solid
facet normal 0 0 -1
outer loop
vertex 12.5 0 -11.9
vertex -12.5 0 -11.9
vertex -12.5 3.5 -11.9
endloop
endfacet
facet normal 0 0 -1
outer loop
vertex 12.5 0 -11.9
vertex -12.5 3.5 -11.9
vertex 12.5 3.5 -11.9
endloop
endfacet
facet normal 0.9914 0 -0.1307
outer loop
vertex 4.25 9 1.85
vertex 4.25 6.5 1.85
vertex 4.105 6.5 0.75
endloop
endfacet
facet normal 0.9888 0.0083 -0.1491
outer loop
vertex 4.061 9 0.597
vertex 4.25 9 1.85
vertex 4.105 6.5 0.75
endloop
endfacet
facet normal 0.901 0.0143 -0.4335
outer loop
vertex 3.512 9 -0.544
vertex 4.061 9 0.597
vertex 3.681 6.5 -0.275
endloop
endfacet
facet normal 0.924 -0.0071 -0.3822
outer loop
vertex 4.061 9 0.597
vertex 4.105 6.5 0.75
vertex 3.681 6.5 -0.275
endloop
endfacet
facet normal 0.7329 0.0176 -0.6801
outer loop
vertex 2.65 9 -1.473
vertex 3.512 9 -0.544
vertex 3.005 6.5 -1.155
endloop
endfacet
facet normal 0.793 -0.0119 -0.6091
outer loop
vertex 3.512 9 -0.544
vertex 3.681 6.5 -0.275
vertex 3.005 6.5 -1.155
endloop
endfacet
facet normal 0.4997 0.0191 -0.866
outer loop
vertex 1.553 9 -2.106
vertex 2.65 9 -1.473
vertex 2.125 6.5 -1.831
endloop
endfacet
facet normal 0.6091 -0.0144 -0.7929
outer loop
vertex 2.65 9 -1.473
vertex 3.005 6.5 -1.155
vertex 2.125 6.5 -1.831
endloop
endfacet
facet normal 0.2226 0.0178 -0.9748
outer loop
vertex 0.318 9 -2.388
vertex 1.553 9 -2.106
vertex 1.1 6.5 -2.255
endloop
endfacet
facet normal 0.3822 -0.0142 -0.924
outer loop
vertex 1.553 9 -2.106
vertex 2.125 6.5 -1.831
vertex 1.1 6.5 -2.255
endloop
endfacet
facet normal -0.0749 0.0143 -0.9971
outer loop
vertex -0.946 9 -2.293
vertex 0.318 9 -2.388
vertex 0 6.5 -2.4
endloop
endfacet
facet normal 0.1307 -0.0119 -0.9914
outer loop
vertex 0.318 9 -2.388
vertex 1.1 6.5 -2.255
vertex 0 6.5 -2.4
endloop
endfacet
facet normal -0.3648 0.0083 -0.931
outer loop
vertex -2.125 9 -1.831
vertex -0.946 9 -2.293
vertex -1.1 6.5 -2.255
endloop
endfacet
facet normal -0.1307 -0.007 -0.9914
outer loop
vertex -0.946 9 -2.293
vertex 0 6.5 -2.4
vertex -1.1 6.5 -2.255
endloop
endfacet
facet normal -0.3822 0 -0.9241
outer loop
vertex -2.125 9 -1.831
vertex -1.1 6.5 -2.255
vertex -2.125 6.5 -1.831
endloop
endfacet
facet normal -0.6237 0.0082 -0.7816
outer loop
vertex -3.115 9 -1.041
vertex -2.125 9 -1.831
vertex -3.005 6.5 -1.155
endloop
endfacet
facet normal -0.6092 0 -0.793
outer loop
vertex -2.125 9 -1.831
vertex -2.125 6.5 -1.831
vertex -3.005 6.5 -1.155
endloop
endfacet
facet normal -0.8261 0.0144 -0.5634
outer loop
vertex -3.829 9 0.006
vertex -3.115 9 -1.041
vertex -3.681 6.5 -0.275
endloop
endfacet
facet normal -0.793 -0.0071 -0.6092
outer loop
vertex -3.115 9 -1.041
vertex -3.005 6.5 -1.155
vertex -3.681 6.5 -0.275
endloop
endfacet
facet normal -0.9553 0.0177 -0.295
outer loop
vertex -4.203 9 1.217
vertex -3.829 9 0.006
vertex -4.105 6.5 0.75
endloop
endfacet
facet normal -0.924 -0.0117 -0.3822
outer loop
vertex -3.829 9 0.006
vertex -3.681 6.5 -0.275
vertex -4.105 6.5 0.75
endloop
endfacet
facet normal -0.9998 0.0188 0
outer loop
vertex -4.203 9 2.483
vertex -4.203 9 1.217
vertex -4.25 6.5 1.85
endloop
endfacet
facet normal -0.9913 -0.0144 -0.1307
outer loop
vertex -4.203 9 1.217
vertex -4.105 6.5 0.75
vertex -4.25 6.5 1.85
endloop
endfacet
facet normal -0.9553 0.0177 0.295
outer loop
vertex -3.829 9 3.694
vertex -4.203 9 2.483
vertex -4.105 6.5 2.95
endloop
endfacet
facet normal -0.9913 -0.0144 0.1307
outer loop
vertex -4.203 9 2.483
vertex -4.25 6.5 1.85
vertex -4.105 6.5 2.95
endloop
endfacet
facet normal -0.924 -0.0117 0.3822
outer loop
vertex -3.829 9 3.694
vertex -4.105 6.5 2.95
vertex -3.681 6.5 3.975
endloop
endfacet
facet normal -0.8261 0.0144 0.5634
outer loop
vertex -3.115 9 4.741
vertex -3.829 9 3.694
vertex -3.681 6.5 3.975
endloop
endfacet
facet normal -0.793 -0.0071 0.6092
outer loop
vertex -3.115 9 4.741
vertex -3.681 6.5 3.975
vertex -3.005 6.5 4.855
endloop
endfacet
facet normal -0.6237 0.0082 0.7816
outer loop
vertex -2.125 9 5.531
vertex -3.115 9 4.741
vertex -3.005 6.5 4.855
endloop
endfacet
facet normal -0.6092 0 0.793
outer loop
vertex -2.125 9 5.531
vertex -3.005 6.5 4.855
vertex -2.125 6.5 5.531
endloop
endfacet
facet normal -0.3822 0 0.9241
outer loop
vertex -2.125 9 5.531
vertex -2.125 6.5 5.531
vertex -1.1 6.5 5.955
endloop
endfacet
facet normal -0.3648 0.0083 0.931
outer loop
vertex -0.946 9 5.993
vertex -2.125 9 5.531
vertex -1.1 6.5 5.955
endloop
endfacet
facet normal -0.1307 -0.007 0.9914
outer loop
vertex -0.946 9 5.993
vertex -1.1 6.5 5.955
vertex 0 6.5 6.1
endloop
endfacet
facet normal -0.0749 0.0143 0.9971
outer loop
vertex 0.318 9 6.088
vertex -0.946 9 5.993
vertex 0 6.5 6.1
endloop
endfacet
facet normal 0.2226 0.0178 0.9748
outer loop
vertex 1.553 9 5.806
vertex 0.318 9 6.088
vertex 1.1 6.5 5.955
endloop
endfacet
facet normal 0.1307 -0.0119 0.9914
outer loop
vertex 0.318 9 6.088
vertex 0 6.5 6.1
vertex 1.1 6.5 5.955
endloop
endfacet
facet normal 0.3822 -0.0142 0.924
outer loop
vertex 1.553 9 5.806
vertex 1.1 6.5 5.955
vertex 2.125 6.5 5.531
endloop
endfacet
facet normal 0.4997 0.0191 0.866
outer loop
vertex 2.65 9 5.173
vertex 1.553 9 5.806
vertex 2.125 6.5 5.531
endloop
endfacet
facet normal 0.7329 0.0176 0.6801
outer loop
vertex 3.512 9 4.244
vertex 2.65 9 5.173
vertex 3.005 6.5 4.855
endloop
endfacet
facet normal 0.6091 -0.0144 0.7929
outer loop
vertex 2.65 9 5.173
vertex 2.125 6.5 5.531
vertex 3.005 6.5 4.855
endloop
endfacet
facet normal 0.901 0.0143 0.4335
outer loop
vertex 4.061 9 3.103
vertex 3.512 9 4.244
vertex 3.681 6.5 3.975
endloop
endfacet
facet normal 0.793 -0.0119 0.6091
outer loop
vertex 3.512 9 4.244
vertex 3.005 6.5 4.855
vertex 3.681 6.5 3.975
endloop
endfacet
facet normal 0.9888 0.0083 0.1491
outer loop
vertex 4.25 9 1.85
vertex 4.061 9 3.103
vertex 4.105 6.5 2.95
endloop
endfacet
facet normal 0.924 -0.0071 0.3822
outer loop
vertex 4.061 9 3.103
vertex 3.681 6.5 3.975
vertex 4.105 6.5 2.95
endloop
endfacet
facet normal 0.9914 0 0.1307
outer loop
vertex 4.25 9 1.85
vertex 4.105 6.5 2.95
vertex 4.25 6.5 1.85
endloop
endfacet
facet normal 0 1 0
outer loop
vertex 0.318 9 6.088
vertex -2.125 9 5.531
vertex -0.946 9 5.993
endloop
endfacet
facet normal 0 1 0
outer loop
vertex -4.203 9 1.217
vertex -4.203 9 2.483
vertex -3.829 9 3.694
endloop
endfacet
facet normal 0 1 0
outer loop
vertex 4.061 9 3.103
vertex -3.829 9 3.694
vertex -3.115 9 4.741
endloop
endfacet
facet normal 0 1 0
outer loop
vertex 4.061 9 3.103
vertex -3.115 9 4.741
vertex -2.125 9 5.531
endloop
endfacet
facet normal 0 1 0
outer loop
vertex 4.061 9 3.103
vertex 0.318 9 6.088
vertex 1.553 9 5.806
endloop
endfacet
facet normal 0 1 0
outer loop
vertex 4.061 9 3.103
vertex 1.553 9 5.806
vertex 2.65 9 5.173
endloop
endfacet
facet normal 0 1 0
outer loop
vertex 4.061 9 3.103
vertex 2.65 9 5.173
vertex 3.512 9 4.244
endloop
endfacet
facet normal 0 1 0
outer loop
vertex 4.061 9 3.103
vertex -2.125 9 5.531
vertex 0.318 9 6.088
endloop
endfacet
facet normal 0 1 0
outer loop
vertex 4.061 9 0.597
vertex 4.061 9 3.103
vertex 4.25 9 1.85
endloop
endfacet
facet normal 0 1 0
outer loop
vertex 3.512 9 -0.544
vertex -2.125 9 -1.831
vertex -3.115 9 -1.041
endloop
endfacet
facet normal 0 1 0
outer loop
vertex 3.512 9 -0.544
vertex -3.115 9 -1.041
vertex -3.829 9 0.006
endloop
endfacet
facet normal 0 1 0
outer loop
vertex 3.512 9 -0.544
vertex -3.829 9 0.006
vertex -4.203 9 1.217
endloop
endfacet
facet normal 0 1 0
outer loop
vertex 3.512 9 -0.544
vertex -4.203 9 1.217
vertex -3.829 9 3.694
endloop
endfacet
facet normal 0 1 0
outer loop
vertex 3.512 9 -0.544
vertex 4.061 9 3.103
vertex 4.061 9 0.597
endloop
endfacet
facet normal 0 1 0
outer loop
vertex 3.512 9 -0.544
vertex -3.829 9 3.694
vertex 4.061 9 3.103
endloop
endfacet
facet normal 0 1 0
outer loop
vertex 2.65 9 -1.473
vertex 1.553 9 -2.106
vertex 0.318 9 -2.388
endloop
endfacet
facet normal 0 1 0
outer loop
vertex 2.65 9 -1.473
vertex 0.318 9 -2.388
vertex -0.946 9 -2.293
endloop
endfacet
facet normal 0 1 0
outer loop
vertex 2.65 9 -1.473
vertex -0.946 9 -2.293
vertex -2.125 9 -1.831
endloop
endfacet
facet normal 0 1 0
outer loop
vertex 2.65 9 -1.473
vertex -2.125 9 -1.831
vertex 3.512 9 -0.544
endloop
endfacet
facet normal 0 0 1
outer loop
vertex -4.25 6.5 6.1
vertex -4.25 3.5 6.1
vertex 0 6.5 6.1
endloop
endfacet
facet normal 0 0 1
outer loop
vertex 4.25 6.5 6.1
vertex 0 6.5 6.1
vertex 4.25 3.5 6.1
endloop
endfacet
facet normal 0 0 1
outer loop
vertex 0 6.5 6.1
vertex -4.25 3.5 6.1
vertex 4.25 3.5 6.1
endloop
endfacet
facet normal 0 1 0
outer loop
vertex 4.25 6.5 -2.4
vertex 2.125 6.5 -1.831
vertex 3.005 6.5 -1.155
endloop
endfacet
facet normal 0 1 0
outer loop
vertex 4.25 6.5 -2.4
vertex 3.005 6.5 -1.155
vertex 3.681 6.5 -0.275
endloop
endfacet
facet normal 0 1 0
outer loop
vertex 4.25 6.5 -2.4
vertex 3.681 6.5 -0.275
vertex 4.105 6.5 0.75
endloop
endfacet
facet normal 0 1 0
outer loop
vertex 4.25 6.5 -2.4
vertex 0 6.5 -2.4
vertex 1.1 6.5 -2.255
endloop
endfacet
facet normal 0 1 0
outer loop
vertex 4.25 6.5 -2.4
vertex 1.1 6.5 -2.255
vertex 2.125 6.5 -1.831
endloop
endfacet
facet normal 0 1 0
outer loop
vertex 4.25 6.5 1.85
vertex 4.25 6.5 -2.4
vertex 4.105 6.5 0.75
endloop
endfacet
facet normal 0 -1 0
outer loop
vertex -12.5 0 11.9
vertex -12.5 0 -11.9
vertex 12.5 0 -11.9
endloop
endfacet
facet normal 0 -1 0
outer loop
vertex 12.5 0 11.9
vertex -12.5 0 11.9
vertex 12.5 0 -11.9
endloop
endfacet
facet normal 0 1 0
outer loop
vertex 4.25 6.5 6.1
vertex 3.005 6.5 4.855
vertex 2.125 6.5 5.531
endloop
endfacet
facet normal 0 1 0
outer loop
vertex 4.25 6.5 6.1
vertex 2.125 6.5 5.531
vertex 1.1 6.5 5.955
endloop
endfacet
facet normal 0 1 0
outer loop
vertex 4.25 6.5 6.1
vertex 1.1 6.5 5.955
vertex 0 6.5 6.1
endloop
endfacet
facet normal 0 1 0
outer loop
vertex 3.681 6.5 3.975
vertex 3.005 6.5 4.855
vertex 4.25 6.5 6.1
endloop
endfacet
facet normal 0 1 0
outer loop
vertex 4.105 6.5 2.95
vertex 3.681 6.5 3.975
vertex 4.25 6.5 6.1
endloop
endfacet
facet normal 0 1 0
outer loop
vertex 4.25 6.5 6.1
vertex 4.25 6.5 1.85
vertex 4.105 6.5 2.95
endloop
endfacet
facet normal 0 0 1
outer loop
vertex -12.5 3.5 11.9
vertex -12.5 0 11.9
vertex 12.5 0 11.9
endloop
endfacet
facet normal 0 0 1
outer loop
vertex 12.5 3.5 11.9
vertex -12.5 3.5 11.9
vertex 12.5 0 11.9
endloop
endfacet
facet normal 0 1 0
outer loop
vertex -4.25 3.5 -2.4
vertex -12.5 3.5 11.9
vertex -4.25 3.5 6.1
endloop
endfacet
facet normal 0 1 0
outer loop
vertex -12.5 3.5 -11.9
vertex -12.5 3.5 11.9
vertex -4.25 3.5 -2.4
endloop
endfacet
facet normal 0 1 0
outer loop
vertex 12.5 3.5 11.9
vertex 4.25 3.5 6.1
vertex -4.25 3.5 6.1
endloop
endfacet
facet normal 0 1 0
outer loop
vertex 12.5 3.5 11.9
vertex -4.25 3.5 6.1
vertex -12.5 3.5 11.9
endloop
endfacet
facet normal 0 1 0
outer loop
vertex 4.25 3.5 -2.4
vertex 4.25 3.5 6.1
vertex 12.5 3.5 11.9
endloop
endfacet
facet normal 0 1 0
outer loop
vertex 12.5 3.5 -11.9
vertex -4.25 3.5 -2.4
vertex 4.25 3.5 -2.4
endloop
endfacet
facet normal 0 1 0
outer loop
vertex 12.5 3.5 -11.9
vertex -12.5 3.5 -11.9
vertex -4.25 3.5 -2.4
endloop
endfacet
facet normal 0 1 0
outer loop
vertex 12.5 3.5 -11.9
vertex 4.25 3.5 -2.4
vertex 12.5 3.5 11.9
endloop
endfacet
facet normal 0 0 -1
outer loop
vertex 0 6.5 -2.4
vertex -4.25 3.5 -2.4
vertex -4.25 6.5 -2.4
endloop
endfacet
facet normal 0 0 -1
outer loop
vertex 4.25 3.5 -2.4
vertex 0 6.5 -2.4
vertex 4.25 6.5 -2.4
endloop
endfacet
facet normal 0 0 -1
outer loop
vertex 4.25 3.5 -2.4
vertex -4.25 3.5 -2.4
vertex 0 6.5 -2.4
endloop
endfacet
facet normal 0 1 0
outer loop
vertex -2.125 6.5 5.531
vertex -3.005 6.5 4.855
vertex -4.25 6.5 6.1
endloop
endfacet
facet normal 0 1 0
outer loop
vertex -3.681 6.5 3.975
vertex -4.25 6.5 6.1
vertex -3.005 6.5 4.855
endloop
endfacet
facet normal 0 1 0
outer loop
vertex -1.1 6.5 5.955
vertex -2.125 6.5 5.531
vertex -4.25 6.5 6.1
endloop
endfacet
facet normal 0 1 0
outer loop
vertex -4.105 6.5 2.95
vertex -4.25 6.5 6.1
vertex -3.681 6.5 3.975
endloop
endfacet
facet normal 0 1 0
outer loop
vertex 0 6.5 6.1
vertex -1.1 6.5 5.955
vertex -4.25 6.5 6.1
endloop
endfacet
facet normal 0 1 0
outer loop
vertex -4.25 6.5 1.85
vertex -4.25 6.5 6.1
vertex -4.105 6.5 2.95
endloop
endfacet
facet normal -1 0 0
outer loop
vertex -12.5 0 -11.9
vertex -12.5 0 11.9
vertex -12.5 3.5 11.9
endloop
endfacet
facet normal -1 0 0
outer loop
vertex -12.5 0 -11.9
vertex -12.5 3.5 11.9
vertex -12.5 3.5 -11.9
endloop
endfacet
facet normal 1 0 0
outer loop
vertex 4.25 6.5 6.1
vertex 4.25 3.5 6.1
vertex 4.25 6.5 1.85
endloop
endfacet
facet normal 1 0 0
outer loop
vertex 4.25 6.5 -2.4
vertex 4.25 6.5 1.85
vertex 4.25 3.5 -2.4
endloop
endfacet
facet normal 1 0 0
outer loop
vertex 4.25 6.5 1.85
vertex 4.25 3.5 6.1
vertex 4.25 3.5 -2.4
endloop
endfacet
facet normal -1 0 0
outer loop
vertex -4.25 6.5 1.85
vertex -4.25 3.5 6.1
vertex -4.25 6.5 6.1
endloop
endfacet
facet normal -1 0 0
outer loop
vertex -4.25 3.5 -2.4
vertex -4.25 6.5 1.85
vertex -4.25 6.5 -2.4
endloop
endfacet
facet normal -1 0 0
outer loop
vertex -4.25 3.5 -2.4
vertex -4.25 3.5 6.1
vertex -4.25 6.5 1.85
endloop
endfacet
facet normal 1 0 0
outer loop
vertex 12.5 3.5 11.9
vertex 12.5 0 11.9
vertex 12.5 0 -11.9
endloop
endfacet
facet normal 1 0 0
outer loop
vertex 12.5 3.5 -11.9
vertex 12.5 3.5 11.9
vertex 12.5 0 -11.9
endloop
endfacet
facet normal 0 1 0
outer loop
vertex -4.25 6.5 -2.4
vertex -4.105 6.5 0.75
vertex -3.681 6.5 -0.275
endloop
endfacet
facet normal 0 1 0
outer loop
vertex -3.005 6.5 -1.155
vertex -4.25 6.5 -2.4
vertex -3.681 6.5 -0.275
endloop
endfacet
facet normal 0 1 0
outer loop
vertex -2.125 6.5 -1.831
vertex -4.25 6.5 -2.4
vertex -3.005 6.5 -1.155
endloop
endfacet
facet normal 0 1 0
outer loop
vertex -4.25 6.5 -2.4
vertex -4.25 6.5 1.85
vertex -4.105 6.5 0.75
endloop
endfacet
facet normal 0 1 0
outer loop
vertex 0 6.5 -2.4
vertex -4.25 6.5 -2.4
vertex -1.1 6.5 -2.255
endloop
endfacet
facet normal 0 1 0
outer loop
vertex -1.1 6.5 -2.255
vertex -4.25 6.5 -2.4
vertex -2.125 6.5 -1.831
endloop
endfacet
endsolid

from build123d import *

# Parameters (mm, degrees)
SKETCH1_W           = 25
SKETCH1_H           = 23.8
BOSS_EXTRUDE1_DEPTH = 3.5
BOSS_EXTRUDE2_START = -3.5
SKETCH2_W           = 8.5
SKETCH2_H           = 8.5
BOSS_EXTRUDE2_DEPTH = 6.5
BOSS_EXTRUDE3_START = -6.5
SKETCH3_R           = 4.25
BOSS_EXTRUDE3_DEPTH = 9


with BuildPart() as part:
    # Sketch1 → Boss-Extrude1 (new body)
    with BuildSketch(Plane(origin=(0, 0, 0), x_dir=(1, 0, 0), z_dir=(0, 1, 0))):
        Rectangle(SKETCH1_W, SKETCH1_H)
    extrude(amount=BOSS_EXTRUDE1_DEPTH)

    # Sketch2 → Boss-Extrude2 (add)
    with BuildSketch(Plane(origin=(0, 3.5, 0), x_dir=(1, 0, 0), z_dir=(0, 1, 0)).offset(BOSS_EXTRUDE2_START)):
        with Locations((0, -1.85)):
            Rectangle(SKETCH2_W, SKETCH2_H)
    extrude(amount=BOSS_EXTRUDE2_DEPTH)

    # Sketch3 → Boss-Extrude3 (add)
    with BuildSketch(Plane(origin=(0, 6.5, 0), x_dir=(1, 0, 0), z_dir=(0, 1, 0)).offset(BOSS_EXTRUDE3_START)):
        with Locations((0, -1.85)):
            Circle(SKETCH3_R)
    extrude(amount=BOSS_EXTRUDE3_DEPTH)


solid = part.part
